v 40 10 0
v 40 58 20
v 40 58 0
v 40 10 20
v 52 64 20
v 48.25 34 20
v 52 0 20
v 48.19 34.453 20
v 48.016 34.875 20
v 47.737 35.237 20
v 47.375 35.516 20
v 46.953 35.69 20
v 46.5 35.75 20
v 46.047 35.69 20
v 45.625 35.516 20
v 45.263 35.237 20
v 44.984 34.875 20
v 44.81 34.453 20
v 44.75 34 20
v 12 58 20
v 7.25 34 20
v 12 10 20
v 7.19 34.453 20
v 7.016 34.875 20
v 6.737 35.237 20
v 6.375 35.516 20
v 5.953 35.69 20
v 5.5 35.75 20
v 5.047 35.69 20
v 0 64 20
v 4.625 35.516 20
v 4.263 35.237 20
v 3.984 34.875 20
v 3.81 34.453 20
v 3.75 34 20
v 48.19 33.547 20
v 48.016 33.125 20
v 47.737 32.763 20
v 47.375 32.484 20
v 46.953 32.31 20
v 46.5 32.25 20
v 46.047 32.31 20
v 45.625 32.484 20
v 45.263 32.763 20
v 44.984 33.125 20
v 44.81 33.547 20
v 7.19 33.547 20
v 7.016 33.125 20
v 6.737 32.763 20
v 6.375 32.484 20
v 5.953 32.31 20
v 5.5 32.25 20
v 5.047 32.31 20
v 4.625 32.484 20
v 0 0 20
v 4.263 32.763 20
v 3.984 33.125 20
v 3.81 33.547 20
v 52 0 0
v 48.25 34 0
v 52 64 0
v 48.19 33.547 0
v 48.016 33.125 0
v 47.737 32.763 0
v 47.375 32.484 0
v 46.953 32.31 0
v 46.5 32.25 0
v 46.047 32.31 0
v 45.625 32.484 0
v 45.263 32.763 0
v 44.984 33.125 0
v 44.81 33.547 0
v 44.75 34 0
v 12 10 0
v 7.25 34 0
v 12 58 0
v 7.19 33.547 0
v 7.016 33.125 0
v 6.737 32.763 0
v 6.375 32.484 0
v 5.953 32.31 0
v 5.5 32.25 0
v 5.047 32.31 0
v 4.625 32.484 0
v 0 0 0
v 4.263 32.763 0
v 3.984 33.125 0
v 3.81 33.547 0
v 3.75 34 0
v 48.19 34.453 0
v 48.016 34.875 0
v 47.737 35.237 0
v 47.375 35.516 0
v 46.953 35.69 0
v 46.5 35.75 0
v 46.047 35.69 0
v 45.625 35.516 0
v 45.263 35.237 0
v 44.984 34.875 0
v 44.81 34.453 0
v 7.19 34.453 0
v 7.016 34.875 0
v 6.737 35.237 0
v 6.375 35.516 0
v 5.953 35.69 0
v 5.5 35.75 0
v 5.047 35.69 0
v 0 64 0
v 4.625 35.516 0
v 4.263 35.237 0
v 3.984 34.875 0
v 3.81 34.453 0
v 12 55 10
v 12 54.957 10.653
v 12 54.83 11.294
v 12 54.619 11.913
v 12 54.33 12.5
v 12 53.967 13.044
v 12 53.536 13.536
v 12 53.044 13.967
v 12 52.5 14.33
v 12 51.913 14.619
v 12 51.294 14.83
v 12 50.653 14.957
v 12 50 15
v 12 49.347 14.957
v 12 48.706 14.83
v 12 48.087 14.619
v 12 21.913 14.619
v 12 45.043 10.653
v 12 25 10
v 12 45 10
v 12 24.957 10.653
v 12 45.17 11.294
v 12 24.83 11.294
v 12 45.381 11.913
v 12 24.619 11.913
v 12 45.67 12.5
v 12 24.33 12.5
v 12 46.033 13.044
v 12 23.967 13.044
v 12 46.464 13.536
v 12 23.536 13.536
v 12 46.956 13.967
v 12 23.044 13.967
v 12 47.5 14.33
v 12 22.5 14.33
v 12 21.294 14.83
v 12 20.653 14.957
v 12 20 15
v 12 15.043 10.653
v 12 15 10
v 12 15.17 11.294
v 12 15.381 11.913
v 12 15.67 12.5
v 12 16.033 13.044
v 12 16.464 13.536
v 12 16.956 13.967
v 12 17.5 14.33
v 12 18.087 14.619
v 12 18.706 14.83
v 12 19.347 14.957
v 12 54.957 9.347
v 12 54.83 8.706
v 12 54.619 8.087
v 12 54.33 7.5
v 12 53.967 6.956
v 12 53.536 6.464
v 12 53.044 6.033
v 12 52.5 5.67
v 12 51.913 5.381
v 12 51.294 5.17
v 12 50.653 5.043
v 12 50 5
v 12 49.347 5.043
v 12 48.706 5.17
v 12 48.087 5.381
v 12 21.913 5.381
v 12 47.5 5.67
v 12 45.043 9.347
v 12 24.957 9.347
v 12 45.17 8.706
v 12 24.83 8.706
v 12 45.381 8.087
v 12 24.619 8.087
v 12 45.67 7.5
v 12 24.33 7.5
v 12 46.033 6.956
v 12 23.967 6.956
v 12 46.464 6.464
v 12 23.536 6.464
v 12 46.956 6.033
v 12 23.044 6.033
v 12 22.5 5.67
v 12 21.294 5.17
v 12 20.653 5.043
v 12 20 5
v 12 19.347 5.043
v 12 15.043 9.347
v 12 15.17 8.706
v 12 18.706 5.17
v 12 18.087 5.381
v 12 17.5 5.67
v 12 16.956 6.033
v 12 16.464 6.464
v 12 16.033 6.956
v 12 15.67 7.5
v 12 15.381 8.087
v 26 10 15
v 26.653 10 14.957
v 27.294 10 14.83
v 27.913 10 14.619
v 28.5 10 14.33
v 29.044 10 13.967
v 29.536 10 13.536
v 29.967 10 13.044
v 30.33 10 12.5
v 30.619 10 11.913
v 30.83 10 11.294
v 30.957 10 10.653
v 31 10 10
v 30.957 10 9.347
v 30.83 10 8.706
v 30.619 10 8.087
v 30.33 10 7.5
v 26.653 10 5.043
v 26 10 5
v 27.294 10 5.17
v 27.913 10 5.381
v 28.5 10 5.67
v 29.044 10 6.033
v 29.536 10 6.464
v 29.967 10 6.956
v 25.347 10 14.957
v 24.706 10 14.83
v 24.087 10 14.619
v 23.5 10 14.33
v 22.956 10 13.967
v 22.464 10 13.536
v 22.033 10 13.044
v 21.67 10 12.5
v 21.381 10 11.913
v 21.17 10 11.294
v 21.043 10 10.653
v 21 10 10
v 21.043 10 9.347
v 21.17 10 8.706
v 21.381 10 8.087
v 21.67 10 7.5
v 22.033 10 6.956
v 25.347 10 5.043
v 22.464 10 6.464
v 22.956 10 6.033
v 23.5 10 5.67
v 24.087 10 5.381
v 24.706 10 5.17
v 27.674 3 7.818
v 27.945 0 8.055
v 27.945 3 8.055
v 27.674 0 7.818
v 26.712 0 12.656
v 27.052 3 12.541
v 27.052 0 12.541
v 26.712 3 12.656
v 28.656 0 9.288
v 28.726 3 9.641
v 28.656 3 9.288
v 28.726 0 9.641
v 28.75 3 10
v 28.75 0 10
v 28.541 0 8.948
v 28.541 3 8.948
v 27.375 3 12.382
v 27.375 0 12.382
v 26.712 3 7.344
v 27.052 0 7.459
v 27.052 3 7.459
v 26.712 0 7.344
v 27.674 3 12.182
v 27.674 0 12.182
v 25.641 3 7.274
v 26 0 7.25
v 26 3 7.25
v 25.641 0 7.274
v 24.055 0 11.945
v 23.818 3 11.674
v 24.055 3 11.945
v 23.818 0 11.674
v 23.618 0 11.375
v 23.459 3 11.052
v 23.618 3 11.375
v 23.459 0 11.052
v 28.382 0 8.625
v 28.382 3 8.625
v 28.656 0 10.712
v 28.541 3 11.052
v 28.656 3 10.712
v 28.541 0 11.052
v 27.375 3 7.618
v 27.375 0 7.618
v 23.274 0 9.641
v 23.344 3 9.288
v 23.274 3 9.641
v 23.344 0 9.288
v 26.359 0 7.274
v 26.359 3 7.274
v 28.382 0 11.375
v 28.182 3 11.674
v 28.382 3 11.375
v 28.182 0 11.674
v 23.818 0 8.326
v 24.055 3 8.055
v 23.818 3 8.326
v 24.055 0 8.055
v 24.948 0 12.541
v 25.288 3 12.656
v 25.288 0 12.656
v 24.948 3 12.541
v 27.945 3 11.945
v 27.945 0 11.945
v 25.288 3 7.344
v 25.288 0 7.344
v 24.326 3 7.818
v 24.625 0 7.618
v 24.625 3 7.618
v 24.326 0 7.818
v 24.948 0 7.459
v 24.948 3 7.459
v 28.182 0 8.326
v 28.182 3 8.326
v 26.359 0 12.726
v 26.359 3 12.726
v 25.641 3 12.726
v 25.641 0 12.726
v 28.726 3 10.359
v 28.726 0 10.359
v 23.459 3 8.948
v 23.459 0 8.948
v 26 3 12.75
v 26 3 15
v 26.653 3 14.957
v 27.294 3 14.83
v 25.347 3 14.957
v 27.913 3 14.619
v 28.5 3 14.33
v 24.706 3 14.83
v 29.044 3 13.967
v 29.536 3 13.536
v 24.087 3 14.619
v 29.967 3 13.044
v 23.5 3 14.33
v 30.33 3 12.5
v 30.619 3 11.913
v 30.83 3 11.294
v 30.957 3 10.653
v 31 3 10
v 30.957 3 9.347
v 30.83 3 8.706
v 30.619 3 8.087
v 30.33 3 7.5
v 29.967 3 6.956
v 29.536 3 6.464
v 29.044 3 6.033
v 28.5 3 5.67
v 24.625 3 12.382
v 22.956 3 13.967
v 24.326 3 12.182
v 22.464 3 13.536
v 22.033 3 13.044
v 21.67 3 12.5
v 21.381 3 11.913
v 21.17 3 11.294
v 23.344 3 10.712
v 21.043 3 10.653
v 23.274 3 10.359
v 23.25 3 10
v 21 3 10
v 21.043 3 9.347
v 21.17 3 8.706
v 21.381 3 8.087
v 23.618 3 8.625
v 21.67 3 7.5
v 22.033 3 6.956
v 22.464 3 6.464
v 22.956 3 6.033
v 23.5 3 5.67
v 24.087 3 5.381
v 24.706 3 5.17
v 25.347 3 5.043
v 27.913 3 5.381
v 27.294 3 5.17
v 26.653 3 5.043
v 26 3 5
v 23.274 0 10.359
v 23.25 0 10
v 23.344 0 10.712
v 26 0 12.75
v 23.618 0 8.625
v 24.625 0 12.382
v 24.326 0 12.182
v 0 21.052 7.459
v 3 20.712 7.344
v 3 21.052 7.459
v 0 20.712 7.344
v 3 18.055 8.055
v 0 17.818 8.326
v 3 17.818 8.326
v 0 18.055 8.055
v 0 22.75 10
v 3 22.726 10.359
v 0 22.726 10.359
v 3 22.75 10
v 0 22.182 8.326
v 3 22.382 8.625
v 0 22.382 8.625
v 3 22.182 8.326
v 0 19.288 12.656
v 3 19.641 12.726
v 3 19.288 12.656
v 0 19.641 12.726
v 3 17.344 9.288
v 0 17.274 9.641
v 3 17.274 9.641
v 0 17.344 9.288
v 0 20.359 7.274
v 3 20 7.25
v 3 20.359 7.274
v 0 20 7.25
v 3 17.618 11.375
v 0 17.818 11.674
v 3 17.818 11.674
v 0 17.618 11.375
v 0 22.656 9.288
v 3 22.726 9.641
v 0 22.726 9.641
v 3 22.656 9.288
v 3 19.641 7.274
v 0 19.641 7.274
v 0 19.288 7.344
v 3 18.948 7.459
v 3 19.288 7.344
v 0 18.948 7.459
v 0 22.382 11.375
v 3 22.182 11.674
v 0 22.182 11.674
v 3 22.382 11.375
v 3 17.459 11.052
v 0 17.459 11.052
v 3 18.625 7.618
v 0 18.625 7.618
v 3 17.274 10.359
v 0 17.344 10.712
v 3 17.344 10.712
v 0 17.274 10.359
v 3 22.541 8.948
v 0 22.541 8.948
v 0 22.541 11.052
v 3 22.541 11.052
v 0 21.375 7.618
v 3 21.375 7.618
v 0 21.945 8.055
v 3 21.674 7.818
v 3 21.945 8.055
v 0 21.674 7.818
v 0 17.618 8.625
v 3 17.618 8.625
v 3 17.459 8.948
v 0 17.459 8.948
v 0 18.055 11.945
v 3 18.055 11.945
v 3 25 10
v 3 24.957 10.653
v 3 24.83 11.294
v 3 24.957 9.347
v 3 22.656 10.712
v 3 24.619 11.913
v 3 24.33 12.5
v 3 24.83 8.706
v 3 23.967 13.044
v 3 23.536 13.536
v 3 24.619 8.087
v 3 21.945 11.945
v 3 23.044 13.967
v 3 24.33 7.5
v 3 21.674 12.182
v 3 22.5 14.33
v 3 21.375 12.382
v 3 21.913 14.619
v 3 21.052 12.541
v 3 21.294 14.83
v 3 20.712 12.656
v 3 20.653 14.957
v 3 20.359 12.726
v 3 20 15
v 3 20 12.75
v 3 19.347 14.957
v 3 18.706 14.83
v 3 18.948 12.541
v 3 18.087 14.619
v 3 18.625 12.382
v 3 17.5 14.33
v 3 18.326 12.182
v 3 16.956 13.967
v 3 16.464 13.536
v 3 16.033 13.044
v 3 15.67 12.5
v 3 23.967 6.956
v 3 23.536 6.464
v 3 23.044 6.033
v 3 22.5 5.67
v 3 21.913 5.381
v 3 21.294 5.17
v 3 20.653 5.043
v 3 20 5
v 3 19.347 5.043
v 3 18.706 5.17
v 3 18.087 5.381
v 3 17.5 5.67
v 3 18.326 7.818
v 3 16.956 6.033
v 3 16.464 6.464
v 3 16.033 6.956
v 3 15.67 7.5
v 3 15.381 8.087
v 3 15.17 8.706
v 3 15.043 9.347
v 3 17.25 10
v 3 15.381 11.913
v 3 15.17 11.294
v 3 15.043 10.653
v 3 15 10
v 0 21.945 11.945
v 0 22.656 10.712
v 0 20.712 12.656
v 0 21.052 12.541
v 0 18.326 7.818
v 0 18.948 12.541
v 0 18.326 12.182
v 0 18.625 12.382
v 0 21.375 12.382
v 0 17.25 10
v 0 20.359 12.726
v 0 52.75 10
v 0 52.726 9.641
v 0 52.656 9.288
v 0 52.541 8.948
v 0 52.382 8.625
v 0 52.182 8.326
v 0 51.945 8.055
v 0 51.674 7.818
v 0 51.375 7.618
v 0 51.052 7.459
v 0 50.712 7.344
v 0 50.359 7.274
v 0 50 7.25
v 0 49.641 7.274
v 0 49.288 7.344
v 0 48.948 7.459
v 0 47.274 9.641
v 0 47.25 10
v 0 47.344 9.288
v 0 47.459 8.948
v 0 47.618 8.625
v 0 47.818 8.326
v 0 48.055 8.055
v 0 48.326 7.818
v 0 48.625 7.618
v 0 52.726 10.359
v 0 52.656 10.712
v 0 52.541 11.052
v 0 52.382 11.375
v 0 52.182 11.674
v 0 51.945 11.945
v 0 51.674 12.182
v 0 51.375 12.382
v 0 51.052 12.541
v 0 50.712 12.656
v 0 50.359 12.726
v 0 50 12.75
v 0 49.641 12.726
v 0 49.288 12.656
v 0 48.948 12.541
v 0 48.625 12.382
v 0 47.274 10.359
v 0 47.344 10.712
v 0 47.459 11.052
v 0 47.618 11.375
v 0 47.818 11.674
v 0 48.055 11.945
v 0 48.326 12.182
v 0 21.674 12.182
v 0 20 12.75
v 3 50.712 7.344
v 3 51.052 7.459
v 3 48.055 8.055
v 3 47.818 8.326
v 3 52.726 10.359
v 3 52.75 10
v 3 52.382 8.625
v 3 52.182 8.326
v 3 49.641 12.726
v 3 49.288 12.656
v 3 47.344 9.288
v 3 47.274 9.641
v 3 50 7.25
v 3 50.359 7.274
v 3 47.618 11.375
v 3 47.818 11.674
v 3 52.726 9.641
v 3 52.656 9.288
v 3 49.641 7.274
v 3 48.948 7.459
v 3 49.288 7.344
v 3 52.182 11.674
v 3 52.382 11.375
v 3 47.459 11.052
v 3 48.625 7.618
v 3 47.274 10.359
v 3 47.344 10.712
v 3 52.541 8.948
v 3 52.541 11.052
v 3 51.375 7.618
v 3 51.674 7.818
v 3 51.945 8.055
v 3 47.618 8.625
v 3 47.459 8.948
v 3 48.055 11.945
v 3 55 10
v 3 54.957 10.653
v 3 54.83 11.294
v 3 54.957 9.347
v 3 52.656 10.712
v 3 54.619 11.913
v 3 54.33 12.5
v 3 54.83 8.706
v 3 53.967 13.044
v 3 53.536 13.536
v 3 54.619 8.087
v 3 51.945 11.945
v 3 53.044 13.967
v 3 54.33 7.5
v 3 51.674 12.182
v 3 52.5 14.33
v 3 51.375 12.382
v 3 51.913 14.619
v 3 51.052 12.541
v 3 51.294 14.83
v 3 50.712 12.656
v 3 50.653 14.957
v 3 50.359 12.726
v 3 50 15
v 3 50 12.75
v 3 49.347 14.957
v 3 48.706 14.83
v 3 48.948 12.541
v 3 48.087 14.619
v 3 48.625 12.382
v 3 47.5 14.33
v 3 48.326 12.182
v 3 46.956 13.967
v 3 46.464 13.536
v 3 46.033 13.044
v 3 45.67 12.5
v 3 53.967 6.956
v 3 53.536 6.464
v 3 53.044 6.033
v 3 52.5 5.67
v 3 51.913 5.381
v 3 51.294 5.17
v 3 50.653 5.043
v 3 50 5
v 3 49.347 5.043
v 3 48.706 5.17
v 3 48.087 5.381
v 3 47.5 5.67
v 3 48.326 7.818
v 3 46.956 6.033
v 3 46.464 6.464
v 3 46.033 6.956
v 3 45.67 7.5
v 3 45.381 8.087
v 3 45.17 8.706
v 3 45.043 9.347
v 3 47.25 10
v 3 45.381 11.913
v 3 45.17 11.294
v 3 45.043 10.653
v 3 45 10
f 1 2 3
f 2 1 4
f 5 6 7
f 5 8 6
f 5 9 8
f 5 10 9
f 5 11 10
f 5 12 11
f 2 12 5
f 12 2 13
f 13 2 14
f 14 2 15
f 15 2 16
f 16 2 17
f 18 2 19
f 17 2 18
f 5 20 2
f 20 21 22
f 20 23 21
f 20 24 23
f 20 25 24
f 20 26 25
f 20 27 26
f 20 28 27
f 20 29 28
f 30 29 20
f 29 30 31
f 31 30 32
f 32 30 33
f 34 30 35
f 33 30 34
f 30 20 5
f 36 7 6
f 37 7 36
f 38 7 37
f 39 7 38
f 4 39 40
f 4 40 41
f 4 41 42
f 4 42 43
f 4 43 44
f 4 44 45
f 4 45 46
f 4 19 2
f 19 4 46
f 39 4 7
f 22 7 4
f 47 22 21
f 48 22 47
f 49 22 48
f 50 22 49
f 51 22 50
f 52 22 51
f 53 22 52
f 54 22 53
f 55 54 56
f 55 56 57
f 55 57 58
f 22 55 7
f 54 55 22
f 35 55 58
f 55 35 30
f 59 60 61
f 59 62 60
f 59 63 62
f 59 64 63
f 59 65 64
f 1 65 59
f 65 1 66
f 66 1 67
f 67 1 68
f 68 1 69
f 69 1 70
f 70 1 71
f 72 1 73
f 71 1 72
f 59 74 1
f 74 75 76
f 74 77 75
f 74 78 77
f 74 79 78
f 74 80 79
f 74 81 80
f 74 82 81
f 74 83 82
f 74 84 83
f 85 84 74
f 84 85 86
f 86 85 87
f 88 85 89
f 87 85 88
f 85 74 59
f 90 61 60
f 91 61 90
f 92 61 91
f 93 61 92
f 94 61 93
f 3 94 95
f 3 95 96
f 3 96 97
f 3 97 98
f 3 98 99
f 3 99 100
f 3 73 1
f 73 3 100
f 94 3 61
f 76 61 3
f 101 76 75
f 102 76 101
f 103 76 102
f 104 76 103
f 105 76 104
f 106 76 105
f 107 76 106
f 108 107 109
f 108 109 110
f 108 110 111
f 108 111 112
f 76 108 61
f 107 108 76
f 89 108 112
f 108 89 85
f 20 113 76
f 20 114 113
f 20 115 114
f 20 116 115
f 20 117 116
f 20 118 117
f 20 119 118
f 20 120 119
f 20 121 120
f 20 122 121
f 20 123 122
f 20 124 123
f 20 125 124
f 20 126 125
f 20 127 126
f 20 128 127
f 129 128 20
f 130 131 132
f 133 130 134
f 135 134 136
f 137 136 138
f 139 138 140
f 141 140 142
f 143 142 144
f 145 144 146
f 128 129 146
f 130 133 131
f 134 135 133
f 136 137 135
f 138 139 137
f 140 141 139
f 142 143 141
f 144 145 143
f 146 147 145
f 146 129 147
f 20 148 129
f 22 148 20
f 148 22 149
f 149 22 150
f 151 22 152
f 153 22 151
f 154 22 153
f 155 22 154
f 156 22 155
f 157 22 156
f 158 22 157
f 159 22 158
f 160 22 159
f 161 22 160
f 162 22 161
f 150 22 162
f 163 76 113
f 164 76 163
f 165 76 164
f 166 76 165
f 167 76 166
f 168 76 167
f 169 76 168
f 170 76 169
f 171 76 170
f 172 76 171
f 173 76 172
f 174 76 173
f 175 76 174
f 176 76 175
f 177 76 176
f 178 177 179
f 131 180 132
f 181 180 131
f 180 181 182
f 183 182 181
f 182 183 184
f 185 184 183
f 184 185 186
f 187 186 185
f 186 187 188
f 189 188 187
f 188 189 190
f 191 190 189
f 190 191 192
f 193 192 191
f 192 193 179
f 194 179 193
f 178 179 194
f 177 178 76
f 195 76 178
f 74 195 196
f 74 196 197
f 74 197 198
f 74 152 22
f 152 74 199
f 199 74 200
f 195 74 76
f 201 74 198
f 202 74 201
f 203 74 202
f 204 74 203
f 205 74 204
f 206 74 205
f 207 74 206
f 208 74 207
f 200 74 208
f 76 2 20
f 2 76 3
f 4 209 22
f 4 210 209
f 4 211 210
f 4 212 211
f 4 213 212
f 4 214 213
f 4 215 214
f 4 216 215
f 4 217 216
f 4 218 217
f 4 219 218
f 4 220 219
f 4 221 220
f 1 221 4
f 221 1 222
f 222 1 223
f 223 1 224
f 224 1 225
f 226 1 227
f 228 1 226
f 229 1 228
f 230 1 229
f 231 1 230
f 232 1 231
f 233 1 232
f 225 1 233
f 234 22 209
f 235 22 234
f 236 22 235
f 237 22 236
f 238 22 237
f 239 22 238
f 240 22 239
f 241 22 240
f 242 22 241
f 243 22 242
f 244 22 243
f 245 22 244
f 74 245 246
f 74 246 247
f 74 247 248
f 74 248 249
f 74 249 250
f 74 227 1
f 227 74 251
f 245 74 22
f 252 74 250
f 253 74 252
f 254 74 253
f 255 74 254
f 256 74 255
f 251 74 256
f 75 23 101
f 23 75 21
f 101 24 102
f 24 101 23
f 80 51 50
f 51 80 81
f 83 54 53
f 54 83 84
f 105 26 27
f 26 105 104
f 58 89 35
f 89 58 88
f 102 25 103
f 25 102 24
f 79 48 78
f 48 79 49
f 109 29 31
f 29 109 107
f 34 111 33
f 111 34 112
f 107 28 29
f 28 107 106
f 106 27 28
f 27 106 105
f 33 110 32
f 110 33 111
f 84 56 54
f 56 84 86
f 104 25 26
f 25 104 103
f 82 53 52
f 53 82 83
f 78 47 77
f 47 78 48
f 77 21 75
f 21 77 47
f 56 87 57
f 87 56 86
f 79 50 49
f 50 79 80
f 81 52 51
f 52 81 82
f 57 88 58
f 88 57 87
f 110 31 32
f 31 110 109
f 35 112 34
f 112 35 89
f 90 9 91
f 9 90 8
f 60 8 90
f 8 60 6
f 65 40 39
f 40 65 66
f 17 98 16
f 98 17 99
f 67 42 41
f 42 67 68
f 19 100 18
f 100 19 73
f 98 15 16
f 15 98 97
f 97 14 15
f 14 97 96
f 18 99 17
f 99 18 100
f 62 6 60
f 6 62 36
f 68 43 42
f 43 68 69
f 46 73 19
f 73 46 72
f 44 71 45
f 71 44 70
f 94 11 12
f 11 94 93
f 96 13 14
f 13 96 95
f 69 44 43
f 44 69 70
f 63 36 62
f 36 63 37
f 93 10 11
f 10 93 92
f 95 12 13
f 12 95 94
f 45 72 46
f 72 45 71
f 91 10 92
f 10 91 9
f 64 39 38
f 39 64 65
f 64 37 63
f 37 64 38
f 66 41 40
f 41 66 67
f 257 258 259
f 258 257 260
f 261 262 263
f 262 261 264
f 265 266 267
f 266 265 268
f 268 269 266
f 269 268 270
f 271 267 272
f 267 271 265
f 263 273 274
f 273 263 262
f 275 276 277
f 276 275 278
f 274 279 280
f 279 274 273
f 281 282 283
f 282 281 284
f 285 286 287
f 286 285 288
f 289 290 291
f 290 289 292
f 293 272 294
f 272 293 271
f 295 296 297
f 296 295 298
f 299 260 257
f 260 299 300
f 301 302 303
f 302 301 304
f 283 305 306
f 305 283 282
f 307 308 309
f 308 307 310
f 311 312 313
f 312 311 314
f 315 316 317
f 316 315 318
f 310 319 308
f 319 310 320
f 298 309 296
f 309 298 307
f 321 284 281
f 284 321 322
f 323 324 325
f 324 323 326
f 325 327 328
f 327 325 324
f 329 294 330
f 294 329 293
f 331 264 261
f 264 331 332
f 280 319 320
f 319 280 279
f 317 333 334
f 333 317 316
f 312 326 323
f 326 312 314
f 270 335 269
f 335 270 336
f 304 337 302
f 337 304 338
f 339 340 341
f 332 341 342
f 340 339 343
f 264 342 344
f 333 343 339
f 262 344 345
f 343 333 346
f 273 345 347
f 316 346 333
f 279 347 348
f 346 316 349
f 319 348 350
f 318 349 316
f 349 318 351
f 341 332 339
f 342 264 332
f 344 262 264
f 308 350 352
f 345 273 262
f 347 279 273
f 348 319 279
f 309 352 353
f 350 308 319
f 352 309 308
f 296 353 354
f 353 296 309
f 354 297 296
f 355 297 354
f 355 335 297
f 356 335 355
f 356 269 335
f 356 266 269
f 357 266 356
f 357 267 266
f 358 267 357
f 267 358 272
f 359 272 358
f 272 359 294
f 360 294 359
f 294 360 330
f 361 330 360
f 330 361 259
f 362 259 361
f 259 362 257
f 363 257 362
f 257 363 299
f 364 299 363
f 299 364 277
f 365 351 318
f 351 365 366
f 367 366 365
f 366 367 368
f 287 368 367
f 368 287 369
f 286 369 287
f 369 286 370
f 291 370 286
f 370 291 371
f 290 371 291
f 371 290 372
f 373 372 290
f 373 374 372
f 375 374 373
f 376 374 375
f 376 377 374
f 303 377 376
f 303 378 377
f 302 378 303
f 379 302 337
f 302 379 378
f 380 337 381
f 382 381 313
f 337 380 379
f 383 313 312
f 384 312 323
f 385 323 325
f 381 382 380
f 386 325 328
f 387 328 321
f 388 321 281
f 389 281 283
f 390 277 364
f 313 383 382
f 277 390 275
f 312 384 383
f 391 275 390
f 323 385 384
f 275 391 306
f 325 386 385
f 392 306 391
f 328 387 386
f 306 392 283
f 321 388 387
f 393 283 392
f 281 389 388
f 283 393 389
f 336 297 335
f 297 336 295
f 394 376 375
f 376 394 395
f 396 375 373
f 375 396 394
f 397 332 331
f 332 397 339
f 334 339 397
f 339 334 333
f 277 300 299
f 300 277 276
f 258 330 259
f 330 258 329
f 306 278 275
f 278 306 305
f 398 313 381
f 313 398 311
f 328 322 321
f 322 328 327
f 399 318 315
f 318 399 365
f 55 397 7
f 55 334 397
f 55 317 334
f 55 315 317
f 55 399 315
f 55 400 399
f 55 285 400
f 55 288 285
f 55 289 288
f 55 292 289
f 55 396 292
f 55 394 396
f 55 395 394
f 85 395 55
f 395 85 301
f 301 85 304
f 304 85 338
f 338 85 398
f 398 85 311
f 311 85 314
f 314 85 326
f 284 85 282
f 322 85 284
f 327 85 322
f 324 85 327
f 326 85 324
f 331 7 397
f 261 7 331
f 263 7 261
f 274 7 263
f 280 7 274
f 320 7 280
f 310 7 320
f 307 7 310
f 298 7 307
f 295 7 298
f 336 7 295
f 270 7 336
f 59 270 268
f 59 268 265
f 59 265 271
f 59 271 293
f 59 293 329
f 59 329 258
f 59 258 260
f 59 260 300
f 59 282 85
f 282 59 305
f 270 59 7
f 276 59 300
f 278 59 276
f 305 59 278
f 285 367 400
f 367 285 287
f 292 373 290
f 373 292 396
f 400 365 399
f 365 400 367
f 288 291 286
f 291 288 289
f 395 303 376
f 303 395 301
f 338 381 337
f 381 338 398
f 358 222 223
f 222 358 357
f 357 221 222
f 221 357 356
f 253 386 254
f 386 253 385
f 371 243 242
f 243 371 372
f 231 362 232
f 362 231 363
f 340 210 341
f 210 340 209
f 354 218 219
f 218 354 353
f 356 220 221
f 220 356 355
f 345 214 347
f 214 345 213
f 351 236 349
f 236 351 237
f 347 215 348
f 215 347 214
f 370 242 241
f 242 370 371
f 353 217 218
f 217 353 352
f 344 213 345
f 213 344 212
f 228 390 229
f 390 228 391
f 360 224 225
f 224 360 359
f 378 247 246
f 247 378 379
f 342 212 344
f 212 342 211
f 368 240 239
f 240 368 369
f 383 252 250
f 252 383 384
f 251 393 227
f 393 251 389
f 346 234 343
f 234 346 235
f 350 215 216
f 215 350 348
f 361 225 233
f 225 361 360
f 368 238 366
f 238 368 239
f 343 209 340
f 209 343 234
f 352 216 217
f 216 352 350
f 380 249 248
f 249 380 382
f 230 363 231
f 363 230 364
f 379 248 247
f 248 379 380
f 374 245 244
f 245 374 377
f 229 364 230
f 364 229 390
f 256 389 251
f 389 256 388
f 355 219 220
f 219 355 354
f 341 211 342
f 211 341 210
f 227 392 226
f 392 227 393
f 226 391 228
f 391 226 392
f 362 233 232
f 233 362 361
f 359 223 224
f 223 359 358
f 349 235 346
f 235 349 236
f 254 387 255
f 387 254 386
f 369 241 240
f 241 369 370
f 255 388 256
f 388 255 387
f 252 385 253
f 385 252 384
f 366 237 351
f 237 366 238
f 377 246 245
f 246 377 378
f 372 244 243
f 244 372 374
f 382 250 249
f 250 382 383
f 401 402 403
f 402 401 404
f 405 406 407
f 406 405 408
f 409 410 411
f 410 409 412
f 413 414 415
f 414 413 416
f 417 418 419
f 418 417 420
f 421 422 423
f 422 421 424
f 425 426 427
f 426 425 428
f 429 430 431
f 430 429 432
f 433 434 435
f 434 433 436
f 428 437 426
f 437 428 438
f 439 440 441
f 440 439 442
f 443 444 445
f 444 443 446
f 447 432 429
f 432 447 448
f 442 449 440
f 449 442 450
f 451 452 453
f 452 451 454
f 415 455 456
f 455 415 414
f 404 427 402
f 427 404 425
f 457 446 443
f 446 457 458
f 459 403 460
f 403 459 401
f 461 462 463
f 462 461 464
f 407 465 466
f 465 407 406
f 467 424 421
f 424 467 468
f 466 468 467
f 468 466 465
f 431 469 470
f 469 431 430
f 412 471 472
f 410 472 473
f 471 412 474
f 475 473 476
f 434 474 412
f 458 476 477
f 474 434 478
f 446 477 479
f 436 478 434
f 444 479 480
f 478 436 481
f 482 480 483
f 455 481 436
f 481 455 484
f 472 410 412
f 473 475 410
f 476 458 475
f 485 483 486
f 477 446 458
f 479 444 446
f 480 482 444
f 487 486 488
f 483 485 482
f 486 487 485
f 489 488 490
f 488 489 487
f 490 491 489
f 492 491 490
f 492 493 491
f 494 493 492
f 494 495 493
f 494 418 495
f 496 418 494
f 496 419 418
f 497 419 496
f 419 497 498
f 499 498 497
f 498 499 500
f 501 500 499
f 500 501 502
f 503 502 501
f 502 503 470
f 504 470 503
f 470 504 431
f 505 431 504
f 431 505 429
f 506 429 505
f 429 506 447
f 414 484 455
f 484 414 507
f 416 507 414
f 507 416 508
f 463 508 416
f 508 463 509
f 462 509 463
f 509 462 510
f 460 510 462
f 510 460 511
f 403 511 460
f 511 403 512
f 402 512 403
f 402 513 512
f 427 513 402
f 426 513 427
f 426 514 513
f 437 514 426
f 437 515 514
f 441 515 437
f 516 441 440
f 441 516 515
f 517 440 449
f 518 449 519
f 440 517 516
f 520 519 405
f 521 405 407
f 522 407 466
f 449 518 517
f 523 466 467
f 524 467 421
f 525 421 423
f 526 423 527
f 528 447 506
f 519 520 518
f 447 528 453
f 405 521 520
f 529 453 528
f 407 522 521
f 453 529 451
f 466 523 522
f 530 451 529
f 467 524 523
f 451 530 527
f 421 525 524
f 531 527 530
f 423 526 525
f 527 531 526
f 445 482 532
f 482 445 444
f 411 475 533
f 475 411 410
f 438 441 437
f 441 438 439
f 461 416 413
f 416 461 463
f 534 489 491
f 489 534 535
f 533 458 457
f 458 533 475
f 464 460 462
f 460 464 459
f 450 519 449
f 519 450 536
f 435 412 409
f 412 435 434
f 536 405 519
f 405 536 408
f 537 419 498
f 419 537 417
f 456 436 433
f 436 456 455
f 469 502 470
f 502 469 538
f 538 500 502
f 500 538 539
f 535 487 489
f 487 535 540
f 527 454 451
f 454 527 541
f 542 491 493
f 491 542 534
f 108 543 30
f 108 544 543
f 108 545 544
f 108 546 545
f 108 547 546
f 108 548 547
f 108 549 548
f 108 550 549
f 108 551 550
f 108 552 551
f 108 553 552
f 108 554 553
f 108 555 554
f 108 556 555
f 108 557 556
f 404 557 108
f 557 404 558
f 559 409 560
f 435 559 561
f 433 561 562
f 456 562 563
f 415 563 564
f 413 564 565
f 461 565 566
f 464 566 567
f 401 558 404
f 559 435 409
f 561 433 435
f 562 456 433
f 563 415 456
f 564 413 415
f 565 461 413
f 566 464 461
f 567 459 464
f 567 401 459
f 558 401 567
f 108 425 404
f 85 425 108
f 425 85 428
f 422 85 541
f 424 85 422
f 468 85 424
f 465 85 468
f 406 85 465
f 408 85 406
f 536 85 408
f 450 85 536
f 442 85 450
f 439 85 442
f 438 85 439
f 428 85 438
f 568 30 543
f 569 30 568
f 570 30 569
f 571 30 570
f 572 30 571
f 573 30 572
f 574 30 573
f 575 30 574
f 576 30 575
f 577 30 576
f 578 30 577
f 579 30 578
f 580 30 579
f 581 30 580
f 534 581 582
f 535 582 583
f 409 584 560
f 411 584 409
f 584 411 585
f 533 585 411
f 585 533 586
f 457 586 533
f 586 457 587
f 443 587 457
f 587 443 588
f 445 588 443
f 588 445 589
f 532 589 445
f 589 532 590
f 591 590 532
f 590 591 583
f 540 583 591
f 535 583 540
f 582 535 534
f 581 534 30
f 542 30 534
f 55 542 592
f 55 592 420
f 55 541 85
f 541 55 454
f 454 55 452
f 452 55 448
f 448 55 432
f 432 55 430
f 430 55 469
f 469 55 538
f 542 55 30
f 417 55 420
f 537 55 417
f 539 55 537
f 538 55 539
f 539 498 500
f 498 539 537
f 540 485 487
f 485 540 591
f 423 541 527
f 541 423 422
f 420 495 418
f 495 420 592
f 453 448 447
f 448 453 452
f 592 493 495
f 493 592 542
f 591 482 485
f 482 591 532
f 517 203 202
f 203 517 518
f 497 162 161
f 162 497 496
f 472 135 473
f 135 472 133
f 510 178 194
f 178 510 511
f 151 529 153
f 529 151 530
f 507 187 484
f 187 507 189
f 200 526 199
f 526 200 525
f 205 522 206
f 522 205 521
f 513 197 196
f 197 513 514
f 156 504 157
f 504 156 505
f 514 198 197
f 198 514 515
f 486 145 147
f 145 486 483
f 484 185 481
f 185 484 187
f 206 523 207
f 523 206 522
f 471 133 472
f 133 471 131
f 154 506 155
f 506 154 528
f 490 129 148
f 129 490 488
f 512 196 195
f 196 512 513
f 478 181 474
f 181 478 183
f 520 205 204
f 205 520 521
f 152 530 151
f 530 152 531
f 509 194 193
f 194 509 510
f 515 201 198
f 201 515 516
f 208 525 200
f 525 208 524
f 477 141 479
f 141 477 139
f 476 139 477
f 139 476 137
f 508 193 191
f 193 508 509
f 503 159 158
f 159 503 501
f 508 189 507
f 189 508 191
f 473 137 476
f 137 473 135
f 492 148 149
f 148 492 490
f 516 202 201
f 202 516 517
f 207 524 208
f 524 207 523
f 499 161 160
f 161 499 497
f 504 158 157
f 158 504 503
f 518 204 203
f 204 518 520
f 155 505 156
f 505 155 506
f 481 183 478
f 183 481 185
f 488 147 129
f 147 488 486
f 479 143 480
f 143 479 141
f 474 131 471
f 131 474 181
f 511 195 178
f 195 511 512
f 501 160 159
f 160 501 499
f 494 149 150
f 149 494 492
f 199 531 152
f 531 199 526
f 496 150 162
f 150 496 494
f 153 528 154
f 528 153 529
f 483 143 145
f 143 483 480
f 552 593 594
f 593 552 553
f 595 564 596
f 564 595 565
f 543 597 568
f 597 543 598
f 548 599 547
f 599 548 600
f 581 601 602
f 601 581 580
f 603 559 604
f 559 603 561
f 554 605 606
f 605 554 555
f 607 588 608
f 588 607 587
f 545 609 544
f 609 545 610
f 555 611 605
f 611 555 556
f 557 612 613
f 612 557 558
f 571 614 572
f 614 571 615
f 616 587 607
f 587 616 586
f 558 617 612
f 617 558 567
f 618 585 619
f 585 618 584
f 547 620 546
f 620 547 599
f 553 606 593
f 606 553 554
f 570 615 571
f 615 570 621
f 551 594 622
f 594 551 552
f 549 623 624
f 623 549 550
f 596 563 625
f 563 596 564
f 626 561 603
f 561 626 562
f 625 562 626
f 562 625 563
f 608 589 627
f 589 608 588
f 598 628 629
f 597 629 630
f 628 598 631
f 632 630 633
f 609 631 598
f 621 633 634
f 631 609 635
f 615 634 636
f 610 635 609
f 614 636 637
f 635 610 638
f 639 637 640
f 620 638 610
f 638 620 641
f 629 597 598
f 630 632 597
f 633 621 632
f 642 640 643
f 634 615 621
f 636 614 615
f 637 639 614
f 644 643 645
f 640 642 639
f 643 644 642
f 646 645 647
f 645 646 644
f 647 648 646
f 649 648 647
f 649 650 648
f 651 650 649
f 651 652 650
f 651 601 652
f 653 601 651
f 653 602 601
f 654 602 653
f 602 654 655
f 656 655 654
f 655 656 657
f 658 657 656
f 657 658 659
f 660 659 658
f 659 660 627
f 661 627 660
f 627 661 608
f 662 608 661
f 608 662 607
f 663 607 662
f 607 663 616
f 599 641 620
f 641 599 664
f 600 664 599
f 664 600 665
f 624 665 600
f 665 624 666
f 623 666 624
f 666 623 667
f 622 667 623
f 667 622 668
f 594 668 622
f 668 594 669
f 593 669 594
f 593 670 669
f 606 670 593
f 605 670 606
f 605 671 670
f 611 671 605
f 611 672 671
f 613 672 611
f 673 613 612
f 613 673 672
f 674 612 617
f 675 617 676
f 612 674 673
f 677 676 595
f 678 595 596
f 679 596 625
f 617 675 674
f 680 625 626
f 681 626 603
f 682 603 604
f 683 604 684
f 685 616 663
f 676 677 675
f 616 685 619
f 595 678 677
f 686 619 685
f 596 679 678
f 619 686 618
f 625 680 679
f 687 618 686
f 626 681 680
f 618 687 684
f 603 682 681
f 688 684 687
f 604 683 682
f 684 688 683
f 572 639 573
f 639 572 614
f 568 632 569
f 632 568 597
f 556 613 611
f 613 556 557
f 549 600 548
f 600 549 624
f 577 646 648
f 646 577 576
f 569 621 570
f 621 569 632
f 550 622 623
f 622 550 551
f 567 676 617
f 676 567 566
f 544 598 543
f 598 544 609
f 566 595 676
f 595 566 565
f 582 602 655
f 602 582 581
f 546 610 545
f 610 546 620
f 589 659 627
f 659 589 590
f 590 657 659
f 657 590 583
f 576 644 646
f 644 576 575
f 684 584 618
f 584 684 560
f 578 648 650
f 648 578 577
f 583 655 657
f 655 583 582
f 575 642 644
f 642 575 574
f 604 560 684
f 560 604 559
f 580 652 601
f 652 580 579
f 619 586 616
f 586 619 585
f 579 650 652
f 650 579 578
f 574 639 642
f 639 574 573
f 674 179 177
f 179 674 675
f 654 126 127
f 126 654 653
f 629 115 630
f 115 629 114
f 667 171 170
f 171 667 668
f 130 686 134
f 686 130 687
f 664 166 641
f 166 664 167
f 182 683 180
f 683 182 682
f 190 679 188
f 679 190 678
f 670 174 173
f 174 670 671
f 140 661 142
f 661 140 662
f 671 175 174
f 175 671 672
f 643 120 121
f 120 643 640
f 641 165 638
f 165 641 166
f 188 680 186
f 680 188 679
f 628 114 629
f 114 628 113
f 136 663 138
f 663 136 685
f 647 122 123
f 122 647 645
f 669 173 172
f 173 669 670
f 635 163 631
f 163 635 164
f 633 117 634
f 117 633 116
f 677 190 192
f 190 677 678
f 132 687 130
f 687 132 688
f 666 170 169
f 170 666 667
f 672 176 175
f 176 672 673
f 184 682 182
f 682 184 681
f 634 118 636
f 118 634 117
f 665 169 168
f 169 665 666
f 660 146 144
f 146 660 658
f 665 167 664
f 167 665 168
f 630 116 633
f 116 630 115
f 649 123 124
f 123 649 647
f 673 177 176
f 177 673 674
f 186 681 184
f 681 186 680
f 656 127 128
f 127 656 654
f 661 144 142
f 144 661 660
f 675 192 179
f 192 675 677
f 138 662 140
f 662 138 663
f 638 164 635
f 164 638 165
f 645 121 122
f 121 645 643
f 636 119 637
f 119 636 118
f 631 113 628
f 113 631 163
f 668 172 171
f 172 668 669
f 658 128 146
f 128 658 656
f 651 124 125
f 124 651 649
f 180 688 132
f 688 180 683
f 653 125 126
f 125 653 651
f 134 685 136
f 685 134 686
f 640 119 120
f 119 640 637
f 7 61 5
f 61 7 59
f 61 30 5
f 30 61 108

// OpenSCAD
difference()
{
    union()
    {
       cube(size=[52,60+4,20]); 
    }
    
    union()
    {
        translate([12,6+4,0])
            cube(size=[28,48,20]);
        translate([12-6.5,6+48/2+4,0])
            cylinder(d=3.5,h=20,$fn=24);
        
        translate([12+28+6.5,6+48/2+4,0])
            cylinder(d=3.5,h=20,$fn=24);
        
        
        translate([52/2,0,10])
            rotate([270,0,0])
                cylinder(d=5.5,h=3,$fn=48);
        translate([52/2,3,10])
            rotate([270,0,0])
                cylinder(d=10,h=10,$fn=48);
        
        
        translate([0,20,10])
            rotate([0,90,0])
                cylinder(d=5.5,h=3,$fn=48);
        translate([3,20,10])
            rotate([0,90,0])
                cylinder(d=10,h=10,$fn=48);
                
        translate([0,50,10])
            rotate([0,90,0])
                cylinder(d=5.5,h=3,$fn=48);
        translate([3,50,10])
            rotate([0,90,0])
                cylinder(d=10,h=10,$fn=48);
    }
    
}
